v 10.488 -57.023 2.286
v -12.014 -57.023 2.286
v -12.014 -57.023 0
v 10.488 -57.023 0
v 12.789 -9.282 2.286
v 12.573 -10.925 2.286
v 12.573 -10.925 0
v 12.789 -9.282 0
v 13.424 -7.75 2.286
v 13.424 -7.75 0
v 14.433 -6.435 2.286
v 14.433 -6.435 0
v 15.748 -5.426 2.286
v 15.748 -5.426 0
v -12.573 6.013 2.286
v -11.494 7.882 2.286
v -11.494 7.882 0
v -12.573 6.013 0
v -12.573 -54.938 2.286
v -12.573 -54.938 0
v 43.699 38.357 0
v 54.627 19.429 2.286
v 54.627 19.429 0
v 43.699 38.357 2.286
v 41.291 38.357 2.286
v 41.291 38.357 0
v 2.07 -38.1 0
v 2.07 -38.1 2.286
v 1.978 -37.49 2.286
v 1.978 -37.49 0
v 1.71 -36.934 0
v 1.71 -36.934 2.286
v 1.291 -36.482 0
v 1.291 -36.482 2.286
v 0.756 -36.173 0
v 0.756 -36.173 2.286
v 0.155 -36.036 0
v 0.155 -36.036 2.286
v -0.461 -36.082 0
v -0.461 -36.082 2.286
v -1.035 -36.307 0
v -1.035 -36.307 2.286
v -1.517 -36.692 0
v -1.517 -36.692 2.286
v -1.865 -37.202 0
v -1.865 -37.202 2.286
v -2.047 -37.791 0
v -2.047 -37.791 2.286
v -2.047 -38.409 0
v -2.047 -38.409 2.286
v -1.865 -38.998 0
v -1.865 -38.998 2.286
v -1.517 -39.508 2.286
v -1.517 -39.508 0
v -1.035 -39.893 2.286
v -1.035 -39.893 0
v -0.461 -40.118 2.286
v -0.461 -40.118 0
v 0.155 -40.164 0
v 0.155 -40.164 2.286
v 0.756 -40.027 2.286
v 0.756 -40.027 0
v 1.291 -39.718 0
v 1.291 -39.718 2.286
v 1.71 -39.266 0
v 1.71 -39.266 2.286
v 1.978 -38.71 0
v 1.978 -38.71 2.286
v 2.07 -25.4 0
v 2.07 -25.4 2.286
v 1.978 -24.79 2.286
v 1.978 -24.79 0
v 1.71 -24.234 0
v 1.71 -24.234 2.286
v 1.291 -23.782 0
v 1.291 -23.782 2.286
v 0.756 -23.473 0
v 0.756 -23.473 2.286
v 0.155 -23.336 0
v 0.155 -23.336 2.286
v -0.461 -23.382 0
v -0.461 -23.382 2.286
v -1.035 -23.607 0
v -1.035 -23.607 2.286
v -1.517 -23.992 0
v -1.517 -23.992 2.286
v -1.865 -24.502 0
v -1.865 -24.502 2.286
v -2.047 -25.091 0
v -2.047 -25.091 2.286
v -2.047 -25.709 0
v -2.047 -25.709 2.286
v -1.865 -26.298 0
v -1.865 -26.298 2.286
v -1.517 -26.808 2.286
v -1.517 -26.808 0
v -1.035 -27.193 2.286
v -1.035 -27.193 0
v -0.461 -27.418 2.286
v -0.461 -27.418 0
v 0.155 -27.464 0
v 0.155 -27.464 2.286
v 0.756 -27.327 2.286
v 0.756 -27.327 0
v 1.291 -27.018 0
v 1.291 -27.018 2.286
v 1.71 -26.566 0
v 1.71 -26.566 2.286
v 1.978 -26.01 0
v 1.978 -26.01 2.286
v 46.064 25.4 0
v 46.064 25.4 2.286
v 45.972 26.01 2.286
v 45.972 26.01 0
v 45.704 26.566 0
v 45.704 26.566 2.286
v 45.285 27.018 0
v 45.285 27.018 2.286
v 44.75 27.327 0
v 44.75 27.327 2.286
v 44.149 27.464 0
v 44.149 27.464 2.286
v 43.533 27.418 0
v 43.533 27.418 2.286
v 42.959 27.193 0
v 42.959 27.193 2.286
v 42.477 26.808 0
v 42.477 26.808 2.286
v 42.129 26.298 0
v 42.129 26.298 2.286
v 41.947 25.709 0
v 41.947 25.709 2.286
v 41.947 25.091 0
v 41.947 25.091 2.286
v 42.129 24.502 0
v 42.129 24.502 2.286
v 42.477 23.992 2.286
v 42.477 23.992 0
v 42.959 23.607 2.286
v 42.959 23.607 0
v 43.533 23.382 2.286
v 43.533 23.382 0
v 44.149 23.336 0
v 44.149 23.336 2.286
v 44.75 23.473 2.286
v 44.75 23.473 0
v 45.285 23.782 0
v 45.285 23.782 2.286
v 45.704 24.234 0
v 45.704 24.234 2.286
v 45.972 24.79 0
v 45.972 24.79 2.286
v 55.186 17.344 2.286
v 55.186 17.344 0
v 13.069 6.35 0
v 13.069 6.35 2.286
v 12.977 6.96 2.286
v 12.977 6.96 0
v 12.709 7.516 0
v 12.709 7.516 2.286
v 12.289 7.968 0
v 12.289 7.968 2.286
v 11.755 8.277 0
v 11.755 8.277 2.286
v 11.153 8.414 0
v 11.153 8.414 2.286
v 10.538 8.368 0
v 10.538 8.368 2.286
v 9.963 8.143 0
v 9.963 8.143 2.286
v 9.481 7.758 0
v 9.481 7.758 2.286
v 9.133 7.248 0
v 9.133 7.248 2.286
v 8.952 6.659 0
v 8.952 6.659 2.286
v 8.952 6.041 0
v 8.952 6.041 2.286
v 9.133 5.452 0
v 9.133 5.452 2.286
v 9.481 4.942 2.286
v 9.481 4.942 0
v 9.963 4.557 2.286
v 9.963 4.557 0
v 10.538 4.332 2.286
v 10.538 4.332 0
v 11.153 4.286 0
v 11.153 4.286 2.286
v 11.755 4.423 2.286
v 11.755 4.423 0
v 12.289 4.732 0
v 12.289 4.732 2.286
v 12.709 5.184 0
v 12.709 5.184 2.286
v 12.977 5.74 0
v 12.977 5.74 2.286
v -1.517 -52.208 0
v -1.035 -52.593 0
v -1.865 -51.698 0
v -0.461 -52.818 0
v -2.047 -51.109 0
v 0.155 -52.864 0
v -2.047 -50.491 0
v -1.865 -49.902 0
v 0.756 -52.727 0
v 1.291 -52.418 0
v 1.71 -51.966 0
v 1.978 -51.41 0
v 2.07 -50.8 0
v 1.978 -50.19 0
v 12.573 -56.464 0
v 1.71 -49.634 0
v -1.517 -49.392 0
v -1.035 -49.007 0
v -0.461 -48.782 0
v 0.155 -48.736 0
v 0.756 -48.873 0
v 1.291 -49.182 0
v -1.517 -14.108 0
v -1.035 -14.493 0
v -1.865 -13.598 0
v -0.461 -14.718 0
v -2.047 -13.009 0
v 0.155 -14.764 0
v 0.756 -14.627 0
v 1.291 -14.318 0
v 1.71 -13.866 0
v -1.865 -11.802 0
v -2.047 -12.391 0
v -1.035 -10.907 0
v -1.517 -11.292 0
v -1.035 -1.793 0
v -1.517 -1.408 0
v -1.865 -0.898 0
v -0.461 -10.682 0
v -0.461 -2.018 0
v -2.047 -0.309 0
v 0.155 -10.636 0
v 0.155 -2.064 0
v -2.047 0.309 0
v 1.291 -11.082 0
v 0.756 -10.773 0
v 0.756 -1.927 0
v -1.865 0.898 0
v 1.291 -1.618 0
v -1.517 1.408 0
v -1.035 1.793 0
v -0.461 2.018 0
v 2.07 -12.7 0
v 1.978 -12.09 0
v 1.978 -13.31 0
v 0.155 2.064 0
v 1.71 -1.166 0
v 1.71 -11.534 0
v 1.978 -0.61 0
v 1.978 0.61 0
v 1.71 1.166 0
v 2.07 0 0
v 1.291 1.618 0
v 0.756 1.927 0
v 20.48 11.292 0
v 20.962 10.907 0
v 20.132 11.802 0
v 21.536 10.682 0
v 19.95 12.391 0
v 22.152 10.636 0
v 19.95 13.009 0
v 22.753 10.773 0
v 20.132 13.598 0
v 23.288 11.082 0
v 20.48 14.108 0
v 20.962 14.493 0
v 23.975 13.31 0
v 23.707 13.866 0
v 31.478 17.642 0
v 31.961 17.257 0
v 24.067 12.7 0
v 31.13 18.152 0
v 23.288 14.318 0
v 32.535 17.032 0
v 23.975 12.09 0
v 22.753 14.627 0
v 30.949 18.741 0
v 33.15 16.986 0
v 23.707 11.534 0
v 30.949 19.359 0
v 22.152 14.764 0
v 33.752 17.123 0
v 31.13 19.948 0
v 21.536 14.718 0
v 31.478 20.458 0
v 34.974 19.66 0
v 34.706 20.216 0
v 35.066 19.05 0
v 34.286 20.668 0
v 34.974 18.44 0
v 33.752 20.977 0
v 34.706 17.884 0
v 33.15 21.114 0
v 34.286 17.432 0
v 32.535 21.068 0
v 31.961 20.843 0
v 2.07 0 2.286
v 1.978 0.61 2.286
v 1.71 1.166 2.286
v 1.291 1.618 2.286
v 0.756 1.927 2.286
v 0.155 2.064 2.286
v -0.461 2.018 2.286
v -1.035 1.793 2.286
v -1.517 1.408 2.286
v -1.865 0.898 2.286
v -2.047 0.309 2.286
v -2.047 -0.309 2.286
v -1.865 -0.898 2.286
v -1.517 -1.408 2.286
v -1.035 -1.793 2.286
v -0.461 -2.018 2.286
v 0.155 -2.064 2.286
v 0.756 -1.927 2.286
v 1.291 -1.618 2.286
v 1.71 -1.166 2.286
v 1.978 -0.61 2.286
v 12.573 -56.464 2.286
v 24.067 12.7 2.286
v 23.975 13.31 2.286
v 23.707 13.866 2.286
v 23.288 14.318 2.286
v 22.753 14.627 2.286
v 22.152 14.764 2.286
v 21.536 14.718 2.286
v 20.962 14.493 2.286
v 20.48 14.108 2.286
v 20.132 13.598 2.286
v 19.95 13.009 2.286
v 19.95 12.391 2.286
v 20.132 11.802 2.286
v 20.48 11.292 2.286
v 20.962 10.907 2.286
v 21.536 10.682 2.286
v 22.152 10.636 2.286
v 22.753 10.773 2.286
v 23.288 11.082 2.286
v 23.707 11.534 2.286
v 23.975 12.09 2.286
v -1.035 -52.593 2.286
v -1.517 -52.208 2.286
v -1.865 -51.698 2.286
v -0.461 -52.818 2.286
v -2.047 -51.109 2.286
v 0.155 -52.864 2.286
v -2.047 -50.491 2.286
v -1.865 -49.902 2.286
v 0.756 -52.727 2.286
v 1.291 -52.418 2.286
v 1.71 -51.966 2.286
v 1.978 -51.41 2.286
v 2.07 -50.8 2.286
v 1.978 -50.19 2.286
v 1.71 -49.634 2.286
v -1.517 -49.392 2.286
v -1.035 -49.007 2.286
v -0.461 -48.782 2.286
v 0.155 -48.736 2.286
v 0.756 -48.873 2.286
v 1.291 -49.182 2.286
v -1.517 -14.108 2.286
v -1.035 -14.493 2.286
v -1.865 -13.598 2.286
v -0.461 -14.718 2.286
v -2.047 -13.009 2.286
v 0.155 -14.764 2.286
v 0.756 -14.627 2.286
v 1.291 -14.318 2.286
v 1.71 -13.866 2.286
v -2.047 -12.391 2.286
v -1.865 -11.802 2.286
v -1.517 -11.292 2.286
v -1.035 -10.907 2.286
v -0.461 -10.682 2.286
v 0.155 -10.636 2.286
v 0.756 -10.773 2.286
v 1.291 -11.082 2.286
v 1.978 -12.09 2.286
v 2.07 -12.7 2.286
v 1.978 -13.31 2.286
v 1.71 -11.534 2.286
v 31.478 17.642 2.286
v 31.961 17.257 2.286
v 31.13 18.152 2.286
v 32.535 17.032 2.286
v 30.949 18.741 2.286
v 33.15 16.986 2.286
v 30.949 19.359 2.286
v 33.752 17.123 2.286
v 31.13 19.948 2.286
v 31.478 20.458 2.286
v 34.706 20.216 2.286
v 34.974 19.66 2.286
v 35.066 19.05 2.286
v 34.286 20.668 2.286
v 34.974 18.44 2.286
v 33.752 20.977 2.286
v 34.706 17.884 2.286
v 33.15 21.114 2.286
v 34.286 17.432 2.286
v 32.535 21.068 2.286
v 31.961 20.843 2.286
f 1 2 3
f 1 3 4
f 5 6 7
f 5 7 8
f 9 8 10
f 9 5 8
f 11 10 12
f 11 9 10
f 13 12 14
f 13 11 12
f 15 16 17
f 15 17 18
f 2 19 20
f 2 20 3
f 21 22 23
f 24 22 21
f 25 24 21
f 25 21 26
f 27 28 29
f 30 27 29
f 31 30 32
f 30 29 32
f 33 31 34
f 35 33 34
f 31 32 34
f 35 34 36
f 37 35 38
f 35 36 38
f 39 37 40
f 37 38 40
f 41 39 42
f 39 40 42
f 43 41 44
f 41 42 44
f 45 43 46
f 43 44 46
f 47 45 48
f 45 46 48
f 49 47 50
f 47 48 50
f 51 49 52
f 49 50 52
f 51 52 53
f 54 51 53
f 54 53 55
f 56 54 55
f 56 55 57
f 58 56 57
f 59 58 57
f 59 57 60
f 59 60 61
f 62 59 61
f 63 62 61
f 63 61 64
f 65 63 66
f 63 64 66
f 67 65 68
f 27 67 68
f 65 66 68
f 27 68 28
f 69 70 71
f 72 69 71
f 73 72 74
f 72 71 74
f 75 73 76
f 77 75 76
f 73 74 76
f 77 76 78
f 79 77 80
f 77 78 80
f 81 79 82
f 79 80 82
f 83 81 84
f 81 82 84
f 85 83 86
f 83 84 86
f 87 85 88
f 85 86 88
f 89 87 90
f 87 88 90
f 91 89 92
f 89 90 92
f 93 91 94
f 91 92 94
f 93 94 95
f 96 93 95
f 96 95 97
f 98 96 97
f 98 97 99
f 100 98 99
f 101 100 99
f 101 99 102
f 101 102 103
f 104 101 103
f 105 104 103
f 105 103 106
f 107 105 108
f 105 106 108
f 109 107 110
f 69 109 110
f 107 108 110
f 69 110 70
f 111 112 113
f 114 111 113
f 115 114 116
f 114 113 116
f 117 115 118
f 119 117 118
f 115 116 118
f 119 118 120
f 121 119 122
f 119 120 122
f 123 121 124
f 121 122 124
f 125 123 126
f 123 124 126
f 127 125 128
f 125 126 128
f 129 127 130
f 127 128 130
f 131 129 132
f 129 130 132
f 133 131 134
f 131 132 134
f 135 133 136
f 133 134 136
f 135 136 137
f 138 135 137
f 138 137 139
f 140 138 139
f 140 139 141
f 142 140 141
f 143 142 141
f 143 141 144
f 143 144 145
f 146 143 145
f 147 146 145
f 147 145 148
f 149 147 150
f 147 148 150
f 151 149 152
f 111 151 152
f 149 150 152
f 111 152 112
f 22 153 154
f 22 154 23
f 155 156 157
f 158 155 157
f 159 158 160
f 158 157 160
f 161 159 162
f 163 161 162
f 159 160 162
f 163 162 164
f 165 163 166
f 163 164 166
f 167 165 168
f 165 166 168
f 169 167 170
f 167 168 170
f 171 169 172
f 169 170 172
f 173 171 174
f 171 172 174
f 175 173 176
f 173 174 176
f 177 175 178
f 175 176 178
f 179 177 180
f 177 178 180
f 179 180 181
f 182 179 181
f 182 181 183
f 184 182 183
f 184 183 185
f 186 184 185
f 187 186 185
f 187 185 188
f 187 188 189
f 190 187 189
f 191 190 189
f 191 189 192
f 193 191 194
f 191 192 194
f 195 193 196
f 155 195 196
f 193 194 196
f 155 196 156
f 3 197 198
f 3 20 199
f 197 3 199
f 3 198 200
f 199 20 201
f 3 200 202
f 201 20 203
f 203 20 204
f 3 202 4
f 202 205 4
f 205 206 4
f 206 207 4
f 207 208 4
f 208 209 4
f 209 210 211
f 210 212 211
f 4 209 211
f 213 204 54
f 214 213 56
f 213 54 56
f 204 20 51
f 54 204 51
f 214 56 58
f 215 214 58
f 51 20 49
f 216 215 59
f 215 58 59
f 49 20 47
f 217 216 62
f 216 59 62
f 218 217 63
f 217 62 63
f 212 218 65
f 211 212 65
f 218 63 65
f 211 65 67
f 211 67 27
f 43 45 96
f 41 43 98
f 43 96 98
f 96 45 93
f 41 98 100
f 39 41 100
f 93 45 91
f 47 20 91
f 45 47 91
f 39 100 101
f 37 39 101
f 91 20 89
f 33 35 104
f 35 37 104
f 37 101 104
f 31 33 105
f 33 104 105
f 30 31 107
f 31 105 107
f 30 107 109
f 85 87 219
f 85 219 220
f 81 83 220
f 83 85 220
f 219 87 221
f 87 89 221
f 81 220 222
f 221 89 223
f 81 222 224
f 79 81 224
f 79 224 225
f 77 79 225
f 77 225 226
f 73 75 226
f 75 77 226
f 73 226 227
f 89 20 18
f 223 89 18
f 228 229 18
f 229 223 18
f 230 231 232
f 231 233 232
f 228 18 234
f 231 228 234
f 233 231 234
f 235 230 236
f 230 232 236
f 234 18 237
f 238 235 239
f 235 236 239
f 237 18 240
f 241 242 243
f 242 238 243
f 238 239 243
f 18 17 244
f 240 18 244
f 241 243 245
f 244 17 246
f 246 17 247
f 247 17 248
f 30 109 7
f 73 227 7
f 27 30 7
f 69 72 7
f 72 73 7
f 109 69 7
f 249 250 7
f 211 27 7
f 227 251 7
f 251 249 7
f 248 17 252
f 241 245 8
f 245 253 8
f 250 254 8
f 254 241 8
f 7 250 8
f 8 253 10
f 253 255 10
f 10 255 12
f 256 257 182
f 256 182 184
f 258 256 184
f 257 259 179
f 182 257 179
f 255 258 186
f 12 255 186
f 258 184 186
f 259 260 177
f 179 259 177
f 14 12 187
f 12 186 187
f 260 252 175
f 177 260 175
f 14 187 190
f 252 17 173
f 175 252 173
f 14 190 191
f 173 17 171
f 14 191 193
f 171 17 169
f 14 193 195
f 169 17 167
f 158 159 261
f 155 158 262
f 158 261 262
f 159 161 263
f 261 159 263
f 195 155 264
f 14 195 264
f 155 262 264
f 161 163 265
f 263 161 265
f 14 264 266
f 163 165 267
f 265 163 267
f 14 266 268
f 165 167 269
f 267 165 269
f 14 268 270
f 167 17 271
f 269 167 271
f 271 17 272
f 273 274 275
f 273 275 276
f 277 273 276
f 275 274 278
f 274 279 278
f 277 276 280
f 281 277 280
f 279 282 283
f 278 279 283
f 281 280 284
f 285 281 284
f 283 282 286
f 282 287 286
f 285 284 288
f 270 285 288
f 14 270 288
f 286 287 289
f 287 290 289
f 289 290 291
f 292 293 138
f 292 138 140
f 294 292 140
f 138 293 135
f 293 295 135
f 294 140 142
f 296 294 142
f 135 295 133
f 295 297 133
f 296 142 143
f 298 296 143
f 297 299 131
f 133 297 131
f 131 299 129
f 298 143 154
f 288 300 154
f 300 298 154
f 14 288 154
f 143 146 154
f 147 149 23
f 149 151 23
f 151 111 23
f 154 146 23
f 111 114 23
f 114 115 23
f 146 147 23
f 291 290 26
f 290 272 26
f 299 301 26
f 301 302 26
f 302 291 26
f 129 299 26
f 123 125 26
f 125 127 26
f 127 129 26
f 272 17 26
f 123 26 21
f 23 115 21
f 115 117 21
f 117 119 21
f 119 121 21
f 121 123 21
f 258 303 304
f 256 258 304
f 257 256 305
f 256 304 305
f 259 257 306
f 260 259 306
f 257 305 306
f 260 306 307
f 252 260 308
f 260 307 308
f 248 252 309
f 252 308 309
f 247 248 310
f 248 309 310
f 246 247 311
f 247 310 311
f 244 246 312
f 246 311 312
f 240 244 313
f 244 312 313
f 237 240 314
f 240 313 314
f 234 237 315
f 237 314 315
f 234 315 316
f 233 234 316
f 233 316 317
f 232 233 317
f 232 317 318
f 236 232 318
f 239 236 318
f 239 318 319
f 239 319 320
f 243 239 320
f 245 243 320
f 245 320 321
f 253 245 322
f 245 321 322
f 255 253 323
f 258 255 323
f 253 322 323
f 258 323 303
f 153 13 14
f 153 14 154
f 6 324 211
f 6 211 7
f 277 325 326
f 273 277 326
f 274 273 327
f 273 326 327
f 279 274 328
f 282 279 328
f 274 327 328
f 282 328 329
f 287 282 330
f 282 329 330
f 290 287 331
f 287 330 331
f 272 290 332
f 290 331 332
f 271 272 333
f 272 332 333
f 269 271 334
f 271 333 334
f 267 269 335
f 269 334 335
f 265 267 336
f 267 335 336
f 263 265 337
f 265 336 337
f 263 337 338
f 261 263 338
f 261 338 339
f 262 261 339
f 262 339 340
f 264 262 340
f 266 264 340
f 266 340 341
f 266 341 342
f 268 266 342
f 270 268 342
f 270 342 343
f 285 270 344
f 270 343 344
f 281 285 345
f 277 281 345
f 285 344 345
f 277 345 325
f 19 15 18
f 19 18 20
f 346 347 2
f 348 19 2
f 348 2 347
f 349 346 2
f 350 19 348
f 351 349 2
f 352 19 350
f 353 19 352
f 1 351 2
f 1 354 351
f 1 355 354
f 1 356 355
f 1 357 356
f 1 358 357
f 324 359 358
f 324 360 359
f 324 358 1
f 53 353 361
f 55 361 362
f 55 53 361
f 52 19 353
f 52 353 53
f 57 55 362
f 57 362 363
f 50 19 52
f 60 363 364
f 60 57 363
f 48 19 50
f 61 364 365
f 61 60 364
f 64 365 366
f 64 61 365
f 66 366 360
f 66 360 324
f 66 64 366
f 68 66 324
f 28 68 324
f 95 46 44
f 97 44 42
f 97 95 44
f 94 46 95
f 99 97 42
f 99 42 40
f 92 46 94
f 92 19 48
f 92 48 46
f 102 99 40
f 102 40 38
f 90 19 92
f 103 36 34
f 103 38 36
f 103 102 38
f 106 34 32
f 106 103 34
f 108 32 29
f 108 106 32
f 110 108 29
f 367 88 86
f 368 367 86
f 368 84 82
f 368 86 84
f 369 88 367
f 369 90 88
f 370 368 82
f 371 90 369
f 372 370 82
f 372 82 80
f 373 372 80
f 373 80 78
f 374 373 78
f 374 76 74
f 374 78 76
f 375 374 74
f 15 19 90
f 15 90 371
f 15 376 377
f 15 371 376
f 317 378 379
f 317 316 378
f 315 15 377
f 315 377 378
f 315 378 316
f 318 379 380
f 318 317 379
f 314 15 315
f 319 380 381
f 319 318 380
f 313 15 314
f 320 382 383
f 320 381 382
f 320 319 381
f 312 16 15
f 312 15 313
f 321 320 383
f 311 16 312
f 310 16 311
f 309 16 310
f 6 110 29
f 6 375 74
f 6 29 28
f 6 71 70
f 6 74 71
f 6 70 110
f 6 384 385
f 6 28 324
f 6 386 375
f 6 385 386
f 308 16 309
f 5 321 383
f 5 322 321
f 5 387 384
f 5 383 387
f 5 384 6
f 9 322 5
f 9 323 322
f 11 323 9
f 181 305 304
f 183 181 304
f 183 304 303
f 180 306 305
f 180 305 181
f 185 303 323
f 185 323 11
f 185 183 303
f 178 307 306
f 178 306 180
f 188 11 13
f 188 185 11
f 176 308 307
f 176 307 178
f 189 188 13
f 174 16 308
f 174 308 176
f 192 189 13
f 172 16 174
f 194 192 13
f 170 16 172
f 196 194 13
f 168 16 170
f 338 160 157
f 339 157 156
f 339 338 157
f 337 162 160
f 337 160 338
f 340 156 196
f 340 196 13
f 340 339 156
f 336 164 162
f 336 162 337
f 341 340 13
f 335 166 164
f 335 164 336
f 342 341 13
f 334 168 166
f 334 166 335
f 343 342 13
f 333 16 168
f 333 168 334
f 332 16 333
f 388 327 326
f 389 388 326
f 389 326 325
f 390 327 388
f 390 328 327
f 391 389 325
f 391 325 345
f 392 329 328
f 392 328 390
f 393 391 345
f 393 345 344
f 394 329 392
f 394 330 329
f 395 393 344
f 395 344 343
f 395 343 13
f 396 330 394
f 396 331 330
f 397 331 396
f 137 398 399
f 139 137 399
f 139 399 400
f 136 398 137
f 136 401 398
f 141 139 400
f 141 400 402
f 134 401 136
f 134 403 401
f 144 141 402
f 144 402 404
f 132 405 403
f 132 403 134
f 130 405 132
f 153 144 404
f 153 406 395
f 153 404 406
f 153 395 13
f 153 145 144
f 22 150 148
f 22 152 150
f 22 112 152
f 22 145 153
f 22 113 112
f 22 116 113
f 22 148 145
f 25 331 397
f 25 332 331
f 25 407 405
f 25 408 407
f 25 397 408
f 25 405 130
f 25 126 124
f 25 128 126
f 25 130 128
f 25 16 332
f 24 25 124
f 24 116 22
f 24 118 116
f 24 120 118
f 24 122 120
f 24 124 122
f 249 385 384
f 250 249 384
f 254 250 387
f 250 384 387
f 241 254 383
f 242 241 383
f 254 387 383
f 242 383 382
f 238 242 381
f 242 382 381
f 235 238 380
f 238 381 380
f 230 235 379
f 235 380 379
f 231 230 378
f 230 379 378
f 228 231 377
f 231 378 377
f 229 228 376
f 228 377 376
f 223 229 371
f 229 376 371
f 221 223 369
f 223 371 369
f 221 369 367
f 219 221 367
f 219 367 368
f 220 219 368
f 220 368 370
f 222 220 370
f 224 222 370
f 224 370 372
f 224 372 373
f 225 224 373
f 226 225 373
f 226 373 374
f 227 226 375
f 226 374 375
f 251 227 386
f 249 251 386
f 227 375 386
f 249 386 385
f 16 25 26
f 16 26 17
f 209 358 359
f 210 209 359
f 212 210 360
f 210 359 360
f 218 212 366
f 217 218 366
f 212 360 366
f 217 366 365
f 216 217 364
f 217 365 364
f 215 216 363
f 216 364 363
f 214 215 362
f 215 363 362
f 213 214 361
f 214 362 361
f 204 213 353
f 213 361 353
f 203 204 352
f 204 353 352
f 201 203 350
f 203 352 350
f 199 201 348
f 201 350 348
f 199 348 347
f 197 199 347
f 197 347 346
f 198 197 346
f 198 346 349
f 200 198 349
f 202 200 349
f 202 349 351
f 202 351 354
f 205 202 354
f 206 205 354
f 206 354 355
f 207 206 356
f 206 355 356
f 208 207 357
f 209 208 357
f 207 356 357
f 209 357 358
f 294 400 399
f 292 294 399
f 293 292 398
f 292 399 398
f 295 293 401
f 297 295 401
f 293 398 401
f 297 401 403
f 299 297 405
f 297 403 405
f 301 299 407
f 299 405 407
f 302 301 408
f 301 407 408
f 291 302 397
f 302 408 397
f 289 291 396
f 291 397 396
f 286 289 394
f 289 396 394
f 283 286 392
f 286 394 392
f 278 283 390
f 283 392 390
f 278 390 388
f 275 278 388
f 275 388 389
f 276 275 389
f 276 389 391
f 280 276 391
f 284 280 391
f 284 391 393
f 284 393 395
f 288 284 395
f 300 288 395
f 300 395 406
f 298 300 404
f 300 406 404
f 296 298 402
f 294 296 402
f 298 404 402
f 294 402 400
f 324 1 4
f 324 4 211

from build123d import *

# Parameters (mm, degrees)
SKETCH1_R           = 2.0701
BOSS_EXTRUDE1_DEPTH = 2.286


with BuildPart() as part:
    # Sketch1 → Boss-Extrude1 (new body)
    with BuildSketch(Plane.XY.offset(2.286)):
        with BuildLine():
            Line((41.2908279, 38.357320472), (-11.4935, 7.88227455))
            Line((-11.4935, 7.88227455), (-12.573, 6.012525703))
            Line((-12.573, 6.012525703), (-12.573, -54.937566141))
            Line((-12.573, -54.937566141), (-12.014209682, -57.023))
            Line((-12.014209682, -57.023), (10.487566141, -57.023))
            Line((10.487566141, -57.023), (12.573, -56.464209682))
            Line((12.573, -56.464209682), (12.573, -10.925199144))
            ThreePointArc((12.573, -10.925199144), (13.423738686, -7.750199144), (15.748, -5.42593783))
            Line((15.748, -5.42593783), (55.185939989, 17.343567439))
            Line((55.185939989, 17.343567439), (54.627149671, 19.429001298))
            Line((54.627149671, 19.429001298), (43.6988795, 38.357320472))
            Line((43.6988795, 38.357320472), (41.2908279, 38.357320472))
        make_face()
        Circle(SKETCH1_R, mode=Mode.SUBTRACT)
        with Locations((0, -38.1)):
            Circle(SKETCH1_R, mode=Mode.SUBTRACT)
        with Locations((0, -12.7)):
            Circle(SKETCH1_R, mode=Mode.SUBTRACT)
        with Locations((0, -25.4)):
            Circle(SKETCH1_R, mode=Mode.SUBTRACT)
        with Locations((0, -50.8)):
            Circle(SKETCH1_R, mode=Mode.SUBTRACT)
        with Locations((32.995567884, 19.05)):
            Circle(SKETCH1_R, mode=Mode.SUBTRACT)
        with Locations((10.998522628, 6.35)):
            Circle(SKETCH1_R, mode=Mode.SUBTRACT)
        with Locations((21.997045256, 12.7)):
            Circle(SKETCH1_R, mode=Mode.SUBTRACT)
        with Locations((43.994090512, 25.4)):
            Circle(SKETCH1_R, mode=Mode.SUBTRACT)
    extrude(amount=-BOSS_EXTRUDE1_DEPTH)


solid = part.part
